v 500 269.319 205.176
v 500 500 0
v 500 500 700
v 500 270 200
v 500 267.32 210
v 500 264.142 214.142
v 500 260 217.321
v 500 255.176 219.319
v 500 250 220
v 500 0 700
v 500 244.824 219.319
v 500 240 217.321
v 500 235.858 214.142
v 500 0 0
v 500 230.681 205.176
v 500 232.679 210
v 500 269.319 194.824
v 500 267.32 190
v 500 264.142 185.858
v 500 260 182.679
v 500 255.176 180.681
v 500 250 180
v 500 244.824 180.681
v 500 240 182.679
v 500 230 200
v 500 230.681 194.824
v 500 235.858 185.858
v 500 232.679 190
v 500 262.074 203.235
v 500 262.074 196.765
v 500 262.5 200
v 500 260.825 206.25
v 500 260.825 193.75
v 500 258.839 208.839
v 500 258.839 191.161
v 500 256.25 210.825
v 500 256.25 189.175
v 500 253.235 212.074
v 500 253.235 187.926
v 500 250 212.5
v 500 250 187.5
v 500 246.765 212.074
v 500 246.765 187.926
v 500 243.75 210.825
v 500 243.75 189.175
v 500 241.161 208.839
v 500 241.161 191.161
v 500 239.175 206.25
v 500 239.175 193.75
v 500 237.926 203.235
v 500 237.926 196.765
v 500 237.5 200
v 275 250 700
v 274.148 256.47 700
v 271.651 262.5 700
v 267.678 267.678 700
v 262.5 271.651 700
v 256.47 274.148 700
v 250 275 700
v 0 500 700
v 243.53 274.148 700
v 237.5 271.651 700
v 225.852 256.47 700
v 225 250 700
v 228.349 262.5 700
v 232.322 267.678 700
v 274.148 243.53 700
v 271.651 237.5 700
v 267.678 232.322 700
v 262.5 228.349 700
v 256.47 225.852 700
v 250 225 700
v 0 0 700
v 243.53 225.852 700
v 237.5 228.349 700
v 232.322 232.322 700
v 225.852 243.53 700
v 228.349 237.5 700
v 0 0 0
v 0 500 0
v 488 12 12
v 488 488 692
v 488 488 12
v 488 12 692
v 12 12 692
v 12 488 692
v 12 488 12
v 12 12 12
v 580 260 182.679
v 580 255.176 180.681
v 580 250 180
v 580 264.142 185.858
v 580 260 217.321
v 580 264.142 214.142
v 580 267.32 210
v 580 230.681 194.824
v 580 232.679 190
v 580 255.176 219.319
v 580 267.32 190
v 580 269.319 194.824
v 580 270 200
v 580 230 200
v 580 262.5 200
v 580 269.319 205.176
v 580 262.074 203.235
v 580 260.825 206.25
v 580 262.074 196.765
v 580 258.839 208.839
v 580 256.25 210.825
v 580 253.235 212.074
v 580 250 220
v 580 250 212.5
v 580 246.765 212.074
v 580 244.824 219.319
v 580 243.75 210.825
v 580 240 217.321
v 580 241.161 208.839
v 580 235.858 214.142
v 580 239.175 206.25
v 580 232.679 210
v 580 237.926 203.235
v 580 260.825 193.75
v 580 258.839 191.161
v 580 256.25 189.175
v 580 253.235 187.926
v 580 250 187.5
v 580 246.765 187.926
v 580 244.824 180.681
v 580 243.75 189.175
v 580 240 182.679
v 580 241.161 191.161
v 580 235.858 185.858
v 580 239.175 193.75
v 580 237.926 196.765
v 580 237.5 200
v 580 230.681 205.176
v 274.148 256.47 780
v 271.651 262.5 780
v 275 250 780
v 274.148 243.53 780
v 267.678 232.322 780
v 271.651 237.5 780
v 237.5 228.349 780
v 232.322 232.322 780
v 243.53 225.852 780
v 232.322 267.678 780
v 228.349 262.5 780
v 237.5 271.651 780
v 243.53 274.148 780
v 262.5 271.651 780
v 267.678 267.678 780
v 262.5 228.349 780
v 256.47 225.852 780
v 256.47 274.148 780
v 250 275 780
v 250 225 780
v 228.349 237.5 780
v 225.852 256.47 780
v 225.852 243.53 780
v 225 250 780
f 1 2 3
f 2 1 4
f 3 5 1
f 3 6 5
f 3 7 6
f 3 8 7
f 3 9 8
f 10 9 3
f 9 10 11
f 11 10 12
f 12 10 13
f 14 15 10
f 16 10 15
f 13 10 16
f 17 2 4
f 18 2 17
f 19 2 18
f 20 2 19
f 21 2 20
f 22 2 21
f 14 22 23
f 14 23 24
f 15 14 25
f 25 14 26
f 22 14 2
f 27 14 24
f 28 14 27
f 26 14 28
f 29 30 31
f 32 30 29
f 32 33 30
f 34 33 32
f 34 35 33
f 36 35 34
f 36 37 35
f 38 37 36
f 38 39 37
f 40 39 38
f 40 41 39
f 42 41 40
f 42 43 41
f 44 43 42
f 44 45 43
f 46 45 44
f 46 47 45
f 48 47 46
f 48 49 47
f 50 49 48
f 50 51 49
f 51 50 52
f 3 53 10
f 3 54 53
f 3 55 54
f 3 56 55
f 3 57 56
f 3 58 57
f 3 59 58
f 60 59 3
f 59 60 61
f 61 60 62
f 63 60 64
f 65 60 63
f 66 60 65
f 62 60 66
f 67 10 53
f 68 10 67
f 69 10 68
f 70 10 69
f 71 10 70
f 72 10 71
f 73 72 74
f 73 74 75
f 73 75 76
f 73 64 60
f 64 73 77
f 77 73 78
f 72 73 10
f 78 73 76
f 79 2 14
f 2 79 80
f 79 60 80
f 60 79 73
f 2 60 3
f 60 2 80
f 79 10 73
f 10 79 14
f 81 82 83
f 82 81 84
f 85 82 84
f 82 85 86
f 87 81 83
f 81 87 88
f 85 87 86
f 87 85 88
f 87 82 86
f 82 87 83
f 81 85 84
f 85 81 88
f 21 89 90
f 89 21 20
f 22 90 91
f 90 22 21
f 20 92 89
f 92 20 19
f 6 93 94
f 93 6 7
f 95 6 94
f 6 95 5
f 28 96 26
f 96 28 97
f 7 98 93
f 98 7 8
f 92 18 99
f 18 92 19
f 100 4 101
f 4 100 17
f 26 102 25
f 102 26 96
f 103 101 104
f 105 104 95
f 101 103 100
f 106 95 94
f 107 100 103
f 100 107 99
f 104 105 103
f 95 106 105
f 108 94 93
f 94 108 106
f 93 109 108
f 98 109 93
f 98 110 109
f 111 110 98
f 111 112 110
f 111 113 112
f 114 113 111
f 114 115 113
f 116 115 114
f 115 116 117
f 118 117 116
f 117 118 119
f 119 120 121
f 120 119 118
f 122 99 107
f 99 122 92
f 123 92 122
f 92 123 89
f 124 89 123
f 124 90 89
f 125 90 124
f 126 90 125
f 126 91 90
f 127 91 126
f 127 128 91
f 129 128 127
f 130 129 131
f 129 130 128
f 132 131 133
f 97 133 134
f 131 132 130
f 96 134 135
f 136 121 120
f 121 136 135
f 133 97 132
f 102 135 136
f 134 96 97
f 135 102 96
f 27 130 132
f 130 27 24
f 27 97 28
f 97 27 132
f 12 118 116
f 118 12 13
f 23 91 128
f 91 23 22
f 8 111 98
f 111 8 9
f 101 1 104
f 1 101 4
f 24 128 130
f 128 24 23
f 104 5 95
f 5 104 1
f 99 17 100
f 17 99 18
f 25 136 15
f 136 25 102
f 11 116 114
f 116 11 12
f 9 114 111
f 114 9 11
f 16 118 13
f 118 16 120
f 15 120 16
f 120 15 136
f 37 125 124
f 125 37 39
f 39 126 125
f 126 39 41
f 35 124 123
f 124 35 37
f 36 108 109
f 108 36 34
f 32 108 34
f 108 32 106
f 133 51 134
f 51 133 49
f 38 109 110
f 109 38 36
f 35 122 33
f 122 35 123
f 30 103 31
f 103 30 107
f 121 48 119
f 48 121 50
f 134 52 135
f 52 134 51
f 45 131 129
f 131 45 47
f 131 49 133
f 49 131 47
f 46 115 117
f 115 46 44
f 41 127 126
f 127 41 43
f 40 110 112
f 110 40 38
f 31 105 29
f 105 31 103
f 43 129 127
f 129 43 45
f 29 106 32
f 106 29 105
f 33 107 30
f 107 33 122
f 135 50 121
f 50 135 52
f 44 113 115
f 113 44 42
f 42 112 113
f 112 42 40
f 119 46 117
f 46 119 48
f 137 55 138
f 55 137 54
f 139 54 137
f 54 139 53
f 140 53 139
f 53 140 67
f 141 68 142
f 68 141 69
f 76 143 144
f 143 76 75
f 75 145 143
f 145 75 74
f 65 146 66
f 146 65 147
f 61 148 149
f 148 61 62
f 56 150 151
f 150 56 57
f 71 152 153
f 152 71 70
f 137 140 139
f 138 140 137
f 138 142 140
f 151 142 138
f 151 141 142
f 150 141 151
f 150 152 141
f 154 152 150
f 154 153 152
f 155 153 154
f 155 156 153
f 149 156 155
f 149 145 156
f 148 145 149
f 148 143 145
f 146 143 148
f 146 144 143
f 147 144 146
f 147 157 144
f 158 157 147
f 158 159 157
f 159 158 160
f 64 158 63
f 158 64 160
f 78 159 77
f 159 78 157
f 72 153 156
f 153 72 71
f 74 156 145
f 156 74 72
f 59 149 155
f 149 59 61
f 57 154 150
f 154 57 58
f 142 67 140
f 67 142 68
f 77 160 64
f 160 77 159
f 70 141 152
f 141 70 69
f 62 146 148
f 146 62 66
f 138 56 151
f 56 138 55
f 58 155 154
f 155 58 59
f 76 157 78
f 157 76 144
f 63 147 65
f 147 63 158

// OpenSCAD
// file: ../params.scad
// Shared millimetre parameters. Keep in lockstep with freecad/params.py.
// Module scale: 150 kg/day wet train. Walls are CPVC sheet, not metal.

$fn = 36;

WALL        = 12;     // CPVC sheet thickness
FLOOR       = 16;     // floor plate (trough sits on this)

// LEACH CSTR 1 — inside liquor box
CSTR_L      = 2000;
CSTR_W      = 1200;
CSTR_H      = 1400;   // liquid + freeboard
FREEBOARD   = 200;

// CSTR 2 weir (same vessel, +X wall)
WEIR_W      = 450;
WEIR_CREST  = CSTR_H - FREEBOARD;   // from inner floor
WEIR_SLOT_H = 80;
WEIR_LIP    = 120;    // external spout projection

// CSTR 3 floor auger — injection-molded PVC / FG
AUGER_D     = 140;    // flight OD
AUGER_SHAFT = 40;
AUGER_PITCH = 110;
AUGER_TROUGH_W = 180;
AUGER_TROUGH_H = 110;
AUGER_OFFSET_Y = 280; // trough centreline from inner -Y wall
AUGER_INCLINE  = 28;  // deg, lifts out of liquor toward +X

// mixer / nozzles (lid)
MIXER_D     = 50;
GAS_D       = 80;     // acid-gas takeoff
DROP_X      = 80;     // inner-X of shred drop slot
DROP_L      = 400;
DROP_W      = 250;
DROP_COAM   = 80;     // raised coaming around the slot

// LEACHATE PUMP / coarse strainer — −X wall, opposite the weir
PUMP_D      = 80;     // DN80
PUMP_Z      = 450;    // centreline above inner floor (submerged)
PUMP_Y      = 900;    // centreline from inner −Y (away from auger)
STRAINER_L  = 180;
STRAINER_W  = 140;
STRAINER_H  = 160;

// mezzanine feed train
MEZZ_H      = 2200;   // platform top above tank outer floor
MEZZ_L      = 1600;   // platform length in −X
MEZZ_THK    = 12;
HOPPER_L    = 700;
HOPPER_W    = 600;
HOPPER_H    = 800;
SHRED_L     = 500;
SHRED_W     = 500;
SHRED_H     = 450;
CONV_W      = 240;
CONV_H      = 120;
CONV_PLATE  = 6;      // trough plate
CONV_FLANGE = 40;
CONV_SPRING_D = 50;
CONV_SPRING_H = 80;
CONV_BOLT   = 10;     // M10 clearance
CONV_LEN    = 1800;   // default standalone length; plant instance is computed
DUST_D      = 150;    // dust-hood outlet to DUST header
AUGER_LIFT_L = 700;

// dewater belts + split (Phase A 4–6)
FDEW_L      = 1800;
FDEW_W      = 450;
FDEW_H      = 80;
FDEW_RISE   = 120;    // solids end higher so liquor runs back to weir
SDEW_L      = 1400;
SDEW_W      = 220;
SDEW_H      = 80;
SPLIT_L     = 600;
SPLIT_W     = 500;
SPLIT_H     = 400;
STUB_L      = 400;
STUB_W      = 300;
STUB_H      = 250;

// EW funnel cell
EW_L        = 600;    // along aisle (overflow direction)
EW_W        = 420;    // anode-cathode depth
EW_H        = 650;    // rectangular body
EW_FUNNEL_H = 220;
EW_VALVE_D  = 50;
EW_VALVE_L  = 60;
EW_MEM_T    = 4;      // CEM
EW_SLOT     = 10;     // membrane cassette slot
EW_PITCH    = 750;    // aisle spacing, centre to centre
AISLE_X0    = 200;
AISLE_Y     = -(EW_W + 2*WALL) - 400;
AISLE_Z     = 400;
BUND_H      = 150;
BUND_PAD    = 250;
SUMP_L      = 400;
SUMP_W      = 400;
SUMP_H      = 300;
VDF_D       = 700;
VDF_L       = 900;
PAIL_W      = 180;
HDR_D       = 80;
HDR_Z       = 1400;
PYRO_D      = 320;
PYRO_L      = 2800;

// Campus envelopes — lockstep with freecad/params.py
FARM_X=12000; FARM_Y=8000; FARM_L=12000; FARM_W=8000; FARM_H=4500;
FAB_X=12000;  FAB_Y=-6000; FAB_L=8000;   FAB_W=6000;  FAB_H=4000;
HAB_X=-8000;  HAB_Y=8000;  HAB_L=8000;   HAB_W=6000;  HAB_H=3200;
CRYO_X=-6000; CRYO_Y=-4000; CRYO_L=4000; CRYO_W=3000; CRYO_H=3000;
MFG_X=2000;   MFG_Y=9000;  MFG_L=6000;   MFG_W=4000;  MFG_H=3500;

LIFE_Z_GREY=900; LIFE_Z_UPW=1100; LIFE_Z_ETCH=1300;
LIFE_Z_O2=2800; LIFE_Z_N2=3000; LIFE_Z_CO2=3200;
LIFE_D_GREY=50; LIFE_D_UPW=40; LIFE_D_ETCH=32;
LIFE_D_GAS=25; LIFE_D_CO2=40;
// main file
// HVAC / Q4 condensate skid. Makeup water the BPM splits. To SALT FEED.
include <../params.scad>;
$fn = 24;

module mfg_q4_hvac() {
    difference() {
        cube([500, 500, 700]);
        translate([12, 12, 12]) cube([476, 476, 680]);
    }
    translate([250, 250, 700]) cylinder(h=80, d=50);
    translate([500, 250, 200]) rotate([0, 90, 0])
        difference() {
            cylinder(h=80, d=40);
            translate([0,0,-1]) cylinder(h=82, d=25);
        }
}

mfg_q4_hvac();
